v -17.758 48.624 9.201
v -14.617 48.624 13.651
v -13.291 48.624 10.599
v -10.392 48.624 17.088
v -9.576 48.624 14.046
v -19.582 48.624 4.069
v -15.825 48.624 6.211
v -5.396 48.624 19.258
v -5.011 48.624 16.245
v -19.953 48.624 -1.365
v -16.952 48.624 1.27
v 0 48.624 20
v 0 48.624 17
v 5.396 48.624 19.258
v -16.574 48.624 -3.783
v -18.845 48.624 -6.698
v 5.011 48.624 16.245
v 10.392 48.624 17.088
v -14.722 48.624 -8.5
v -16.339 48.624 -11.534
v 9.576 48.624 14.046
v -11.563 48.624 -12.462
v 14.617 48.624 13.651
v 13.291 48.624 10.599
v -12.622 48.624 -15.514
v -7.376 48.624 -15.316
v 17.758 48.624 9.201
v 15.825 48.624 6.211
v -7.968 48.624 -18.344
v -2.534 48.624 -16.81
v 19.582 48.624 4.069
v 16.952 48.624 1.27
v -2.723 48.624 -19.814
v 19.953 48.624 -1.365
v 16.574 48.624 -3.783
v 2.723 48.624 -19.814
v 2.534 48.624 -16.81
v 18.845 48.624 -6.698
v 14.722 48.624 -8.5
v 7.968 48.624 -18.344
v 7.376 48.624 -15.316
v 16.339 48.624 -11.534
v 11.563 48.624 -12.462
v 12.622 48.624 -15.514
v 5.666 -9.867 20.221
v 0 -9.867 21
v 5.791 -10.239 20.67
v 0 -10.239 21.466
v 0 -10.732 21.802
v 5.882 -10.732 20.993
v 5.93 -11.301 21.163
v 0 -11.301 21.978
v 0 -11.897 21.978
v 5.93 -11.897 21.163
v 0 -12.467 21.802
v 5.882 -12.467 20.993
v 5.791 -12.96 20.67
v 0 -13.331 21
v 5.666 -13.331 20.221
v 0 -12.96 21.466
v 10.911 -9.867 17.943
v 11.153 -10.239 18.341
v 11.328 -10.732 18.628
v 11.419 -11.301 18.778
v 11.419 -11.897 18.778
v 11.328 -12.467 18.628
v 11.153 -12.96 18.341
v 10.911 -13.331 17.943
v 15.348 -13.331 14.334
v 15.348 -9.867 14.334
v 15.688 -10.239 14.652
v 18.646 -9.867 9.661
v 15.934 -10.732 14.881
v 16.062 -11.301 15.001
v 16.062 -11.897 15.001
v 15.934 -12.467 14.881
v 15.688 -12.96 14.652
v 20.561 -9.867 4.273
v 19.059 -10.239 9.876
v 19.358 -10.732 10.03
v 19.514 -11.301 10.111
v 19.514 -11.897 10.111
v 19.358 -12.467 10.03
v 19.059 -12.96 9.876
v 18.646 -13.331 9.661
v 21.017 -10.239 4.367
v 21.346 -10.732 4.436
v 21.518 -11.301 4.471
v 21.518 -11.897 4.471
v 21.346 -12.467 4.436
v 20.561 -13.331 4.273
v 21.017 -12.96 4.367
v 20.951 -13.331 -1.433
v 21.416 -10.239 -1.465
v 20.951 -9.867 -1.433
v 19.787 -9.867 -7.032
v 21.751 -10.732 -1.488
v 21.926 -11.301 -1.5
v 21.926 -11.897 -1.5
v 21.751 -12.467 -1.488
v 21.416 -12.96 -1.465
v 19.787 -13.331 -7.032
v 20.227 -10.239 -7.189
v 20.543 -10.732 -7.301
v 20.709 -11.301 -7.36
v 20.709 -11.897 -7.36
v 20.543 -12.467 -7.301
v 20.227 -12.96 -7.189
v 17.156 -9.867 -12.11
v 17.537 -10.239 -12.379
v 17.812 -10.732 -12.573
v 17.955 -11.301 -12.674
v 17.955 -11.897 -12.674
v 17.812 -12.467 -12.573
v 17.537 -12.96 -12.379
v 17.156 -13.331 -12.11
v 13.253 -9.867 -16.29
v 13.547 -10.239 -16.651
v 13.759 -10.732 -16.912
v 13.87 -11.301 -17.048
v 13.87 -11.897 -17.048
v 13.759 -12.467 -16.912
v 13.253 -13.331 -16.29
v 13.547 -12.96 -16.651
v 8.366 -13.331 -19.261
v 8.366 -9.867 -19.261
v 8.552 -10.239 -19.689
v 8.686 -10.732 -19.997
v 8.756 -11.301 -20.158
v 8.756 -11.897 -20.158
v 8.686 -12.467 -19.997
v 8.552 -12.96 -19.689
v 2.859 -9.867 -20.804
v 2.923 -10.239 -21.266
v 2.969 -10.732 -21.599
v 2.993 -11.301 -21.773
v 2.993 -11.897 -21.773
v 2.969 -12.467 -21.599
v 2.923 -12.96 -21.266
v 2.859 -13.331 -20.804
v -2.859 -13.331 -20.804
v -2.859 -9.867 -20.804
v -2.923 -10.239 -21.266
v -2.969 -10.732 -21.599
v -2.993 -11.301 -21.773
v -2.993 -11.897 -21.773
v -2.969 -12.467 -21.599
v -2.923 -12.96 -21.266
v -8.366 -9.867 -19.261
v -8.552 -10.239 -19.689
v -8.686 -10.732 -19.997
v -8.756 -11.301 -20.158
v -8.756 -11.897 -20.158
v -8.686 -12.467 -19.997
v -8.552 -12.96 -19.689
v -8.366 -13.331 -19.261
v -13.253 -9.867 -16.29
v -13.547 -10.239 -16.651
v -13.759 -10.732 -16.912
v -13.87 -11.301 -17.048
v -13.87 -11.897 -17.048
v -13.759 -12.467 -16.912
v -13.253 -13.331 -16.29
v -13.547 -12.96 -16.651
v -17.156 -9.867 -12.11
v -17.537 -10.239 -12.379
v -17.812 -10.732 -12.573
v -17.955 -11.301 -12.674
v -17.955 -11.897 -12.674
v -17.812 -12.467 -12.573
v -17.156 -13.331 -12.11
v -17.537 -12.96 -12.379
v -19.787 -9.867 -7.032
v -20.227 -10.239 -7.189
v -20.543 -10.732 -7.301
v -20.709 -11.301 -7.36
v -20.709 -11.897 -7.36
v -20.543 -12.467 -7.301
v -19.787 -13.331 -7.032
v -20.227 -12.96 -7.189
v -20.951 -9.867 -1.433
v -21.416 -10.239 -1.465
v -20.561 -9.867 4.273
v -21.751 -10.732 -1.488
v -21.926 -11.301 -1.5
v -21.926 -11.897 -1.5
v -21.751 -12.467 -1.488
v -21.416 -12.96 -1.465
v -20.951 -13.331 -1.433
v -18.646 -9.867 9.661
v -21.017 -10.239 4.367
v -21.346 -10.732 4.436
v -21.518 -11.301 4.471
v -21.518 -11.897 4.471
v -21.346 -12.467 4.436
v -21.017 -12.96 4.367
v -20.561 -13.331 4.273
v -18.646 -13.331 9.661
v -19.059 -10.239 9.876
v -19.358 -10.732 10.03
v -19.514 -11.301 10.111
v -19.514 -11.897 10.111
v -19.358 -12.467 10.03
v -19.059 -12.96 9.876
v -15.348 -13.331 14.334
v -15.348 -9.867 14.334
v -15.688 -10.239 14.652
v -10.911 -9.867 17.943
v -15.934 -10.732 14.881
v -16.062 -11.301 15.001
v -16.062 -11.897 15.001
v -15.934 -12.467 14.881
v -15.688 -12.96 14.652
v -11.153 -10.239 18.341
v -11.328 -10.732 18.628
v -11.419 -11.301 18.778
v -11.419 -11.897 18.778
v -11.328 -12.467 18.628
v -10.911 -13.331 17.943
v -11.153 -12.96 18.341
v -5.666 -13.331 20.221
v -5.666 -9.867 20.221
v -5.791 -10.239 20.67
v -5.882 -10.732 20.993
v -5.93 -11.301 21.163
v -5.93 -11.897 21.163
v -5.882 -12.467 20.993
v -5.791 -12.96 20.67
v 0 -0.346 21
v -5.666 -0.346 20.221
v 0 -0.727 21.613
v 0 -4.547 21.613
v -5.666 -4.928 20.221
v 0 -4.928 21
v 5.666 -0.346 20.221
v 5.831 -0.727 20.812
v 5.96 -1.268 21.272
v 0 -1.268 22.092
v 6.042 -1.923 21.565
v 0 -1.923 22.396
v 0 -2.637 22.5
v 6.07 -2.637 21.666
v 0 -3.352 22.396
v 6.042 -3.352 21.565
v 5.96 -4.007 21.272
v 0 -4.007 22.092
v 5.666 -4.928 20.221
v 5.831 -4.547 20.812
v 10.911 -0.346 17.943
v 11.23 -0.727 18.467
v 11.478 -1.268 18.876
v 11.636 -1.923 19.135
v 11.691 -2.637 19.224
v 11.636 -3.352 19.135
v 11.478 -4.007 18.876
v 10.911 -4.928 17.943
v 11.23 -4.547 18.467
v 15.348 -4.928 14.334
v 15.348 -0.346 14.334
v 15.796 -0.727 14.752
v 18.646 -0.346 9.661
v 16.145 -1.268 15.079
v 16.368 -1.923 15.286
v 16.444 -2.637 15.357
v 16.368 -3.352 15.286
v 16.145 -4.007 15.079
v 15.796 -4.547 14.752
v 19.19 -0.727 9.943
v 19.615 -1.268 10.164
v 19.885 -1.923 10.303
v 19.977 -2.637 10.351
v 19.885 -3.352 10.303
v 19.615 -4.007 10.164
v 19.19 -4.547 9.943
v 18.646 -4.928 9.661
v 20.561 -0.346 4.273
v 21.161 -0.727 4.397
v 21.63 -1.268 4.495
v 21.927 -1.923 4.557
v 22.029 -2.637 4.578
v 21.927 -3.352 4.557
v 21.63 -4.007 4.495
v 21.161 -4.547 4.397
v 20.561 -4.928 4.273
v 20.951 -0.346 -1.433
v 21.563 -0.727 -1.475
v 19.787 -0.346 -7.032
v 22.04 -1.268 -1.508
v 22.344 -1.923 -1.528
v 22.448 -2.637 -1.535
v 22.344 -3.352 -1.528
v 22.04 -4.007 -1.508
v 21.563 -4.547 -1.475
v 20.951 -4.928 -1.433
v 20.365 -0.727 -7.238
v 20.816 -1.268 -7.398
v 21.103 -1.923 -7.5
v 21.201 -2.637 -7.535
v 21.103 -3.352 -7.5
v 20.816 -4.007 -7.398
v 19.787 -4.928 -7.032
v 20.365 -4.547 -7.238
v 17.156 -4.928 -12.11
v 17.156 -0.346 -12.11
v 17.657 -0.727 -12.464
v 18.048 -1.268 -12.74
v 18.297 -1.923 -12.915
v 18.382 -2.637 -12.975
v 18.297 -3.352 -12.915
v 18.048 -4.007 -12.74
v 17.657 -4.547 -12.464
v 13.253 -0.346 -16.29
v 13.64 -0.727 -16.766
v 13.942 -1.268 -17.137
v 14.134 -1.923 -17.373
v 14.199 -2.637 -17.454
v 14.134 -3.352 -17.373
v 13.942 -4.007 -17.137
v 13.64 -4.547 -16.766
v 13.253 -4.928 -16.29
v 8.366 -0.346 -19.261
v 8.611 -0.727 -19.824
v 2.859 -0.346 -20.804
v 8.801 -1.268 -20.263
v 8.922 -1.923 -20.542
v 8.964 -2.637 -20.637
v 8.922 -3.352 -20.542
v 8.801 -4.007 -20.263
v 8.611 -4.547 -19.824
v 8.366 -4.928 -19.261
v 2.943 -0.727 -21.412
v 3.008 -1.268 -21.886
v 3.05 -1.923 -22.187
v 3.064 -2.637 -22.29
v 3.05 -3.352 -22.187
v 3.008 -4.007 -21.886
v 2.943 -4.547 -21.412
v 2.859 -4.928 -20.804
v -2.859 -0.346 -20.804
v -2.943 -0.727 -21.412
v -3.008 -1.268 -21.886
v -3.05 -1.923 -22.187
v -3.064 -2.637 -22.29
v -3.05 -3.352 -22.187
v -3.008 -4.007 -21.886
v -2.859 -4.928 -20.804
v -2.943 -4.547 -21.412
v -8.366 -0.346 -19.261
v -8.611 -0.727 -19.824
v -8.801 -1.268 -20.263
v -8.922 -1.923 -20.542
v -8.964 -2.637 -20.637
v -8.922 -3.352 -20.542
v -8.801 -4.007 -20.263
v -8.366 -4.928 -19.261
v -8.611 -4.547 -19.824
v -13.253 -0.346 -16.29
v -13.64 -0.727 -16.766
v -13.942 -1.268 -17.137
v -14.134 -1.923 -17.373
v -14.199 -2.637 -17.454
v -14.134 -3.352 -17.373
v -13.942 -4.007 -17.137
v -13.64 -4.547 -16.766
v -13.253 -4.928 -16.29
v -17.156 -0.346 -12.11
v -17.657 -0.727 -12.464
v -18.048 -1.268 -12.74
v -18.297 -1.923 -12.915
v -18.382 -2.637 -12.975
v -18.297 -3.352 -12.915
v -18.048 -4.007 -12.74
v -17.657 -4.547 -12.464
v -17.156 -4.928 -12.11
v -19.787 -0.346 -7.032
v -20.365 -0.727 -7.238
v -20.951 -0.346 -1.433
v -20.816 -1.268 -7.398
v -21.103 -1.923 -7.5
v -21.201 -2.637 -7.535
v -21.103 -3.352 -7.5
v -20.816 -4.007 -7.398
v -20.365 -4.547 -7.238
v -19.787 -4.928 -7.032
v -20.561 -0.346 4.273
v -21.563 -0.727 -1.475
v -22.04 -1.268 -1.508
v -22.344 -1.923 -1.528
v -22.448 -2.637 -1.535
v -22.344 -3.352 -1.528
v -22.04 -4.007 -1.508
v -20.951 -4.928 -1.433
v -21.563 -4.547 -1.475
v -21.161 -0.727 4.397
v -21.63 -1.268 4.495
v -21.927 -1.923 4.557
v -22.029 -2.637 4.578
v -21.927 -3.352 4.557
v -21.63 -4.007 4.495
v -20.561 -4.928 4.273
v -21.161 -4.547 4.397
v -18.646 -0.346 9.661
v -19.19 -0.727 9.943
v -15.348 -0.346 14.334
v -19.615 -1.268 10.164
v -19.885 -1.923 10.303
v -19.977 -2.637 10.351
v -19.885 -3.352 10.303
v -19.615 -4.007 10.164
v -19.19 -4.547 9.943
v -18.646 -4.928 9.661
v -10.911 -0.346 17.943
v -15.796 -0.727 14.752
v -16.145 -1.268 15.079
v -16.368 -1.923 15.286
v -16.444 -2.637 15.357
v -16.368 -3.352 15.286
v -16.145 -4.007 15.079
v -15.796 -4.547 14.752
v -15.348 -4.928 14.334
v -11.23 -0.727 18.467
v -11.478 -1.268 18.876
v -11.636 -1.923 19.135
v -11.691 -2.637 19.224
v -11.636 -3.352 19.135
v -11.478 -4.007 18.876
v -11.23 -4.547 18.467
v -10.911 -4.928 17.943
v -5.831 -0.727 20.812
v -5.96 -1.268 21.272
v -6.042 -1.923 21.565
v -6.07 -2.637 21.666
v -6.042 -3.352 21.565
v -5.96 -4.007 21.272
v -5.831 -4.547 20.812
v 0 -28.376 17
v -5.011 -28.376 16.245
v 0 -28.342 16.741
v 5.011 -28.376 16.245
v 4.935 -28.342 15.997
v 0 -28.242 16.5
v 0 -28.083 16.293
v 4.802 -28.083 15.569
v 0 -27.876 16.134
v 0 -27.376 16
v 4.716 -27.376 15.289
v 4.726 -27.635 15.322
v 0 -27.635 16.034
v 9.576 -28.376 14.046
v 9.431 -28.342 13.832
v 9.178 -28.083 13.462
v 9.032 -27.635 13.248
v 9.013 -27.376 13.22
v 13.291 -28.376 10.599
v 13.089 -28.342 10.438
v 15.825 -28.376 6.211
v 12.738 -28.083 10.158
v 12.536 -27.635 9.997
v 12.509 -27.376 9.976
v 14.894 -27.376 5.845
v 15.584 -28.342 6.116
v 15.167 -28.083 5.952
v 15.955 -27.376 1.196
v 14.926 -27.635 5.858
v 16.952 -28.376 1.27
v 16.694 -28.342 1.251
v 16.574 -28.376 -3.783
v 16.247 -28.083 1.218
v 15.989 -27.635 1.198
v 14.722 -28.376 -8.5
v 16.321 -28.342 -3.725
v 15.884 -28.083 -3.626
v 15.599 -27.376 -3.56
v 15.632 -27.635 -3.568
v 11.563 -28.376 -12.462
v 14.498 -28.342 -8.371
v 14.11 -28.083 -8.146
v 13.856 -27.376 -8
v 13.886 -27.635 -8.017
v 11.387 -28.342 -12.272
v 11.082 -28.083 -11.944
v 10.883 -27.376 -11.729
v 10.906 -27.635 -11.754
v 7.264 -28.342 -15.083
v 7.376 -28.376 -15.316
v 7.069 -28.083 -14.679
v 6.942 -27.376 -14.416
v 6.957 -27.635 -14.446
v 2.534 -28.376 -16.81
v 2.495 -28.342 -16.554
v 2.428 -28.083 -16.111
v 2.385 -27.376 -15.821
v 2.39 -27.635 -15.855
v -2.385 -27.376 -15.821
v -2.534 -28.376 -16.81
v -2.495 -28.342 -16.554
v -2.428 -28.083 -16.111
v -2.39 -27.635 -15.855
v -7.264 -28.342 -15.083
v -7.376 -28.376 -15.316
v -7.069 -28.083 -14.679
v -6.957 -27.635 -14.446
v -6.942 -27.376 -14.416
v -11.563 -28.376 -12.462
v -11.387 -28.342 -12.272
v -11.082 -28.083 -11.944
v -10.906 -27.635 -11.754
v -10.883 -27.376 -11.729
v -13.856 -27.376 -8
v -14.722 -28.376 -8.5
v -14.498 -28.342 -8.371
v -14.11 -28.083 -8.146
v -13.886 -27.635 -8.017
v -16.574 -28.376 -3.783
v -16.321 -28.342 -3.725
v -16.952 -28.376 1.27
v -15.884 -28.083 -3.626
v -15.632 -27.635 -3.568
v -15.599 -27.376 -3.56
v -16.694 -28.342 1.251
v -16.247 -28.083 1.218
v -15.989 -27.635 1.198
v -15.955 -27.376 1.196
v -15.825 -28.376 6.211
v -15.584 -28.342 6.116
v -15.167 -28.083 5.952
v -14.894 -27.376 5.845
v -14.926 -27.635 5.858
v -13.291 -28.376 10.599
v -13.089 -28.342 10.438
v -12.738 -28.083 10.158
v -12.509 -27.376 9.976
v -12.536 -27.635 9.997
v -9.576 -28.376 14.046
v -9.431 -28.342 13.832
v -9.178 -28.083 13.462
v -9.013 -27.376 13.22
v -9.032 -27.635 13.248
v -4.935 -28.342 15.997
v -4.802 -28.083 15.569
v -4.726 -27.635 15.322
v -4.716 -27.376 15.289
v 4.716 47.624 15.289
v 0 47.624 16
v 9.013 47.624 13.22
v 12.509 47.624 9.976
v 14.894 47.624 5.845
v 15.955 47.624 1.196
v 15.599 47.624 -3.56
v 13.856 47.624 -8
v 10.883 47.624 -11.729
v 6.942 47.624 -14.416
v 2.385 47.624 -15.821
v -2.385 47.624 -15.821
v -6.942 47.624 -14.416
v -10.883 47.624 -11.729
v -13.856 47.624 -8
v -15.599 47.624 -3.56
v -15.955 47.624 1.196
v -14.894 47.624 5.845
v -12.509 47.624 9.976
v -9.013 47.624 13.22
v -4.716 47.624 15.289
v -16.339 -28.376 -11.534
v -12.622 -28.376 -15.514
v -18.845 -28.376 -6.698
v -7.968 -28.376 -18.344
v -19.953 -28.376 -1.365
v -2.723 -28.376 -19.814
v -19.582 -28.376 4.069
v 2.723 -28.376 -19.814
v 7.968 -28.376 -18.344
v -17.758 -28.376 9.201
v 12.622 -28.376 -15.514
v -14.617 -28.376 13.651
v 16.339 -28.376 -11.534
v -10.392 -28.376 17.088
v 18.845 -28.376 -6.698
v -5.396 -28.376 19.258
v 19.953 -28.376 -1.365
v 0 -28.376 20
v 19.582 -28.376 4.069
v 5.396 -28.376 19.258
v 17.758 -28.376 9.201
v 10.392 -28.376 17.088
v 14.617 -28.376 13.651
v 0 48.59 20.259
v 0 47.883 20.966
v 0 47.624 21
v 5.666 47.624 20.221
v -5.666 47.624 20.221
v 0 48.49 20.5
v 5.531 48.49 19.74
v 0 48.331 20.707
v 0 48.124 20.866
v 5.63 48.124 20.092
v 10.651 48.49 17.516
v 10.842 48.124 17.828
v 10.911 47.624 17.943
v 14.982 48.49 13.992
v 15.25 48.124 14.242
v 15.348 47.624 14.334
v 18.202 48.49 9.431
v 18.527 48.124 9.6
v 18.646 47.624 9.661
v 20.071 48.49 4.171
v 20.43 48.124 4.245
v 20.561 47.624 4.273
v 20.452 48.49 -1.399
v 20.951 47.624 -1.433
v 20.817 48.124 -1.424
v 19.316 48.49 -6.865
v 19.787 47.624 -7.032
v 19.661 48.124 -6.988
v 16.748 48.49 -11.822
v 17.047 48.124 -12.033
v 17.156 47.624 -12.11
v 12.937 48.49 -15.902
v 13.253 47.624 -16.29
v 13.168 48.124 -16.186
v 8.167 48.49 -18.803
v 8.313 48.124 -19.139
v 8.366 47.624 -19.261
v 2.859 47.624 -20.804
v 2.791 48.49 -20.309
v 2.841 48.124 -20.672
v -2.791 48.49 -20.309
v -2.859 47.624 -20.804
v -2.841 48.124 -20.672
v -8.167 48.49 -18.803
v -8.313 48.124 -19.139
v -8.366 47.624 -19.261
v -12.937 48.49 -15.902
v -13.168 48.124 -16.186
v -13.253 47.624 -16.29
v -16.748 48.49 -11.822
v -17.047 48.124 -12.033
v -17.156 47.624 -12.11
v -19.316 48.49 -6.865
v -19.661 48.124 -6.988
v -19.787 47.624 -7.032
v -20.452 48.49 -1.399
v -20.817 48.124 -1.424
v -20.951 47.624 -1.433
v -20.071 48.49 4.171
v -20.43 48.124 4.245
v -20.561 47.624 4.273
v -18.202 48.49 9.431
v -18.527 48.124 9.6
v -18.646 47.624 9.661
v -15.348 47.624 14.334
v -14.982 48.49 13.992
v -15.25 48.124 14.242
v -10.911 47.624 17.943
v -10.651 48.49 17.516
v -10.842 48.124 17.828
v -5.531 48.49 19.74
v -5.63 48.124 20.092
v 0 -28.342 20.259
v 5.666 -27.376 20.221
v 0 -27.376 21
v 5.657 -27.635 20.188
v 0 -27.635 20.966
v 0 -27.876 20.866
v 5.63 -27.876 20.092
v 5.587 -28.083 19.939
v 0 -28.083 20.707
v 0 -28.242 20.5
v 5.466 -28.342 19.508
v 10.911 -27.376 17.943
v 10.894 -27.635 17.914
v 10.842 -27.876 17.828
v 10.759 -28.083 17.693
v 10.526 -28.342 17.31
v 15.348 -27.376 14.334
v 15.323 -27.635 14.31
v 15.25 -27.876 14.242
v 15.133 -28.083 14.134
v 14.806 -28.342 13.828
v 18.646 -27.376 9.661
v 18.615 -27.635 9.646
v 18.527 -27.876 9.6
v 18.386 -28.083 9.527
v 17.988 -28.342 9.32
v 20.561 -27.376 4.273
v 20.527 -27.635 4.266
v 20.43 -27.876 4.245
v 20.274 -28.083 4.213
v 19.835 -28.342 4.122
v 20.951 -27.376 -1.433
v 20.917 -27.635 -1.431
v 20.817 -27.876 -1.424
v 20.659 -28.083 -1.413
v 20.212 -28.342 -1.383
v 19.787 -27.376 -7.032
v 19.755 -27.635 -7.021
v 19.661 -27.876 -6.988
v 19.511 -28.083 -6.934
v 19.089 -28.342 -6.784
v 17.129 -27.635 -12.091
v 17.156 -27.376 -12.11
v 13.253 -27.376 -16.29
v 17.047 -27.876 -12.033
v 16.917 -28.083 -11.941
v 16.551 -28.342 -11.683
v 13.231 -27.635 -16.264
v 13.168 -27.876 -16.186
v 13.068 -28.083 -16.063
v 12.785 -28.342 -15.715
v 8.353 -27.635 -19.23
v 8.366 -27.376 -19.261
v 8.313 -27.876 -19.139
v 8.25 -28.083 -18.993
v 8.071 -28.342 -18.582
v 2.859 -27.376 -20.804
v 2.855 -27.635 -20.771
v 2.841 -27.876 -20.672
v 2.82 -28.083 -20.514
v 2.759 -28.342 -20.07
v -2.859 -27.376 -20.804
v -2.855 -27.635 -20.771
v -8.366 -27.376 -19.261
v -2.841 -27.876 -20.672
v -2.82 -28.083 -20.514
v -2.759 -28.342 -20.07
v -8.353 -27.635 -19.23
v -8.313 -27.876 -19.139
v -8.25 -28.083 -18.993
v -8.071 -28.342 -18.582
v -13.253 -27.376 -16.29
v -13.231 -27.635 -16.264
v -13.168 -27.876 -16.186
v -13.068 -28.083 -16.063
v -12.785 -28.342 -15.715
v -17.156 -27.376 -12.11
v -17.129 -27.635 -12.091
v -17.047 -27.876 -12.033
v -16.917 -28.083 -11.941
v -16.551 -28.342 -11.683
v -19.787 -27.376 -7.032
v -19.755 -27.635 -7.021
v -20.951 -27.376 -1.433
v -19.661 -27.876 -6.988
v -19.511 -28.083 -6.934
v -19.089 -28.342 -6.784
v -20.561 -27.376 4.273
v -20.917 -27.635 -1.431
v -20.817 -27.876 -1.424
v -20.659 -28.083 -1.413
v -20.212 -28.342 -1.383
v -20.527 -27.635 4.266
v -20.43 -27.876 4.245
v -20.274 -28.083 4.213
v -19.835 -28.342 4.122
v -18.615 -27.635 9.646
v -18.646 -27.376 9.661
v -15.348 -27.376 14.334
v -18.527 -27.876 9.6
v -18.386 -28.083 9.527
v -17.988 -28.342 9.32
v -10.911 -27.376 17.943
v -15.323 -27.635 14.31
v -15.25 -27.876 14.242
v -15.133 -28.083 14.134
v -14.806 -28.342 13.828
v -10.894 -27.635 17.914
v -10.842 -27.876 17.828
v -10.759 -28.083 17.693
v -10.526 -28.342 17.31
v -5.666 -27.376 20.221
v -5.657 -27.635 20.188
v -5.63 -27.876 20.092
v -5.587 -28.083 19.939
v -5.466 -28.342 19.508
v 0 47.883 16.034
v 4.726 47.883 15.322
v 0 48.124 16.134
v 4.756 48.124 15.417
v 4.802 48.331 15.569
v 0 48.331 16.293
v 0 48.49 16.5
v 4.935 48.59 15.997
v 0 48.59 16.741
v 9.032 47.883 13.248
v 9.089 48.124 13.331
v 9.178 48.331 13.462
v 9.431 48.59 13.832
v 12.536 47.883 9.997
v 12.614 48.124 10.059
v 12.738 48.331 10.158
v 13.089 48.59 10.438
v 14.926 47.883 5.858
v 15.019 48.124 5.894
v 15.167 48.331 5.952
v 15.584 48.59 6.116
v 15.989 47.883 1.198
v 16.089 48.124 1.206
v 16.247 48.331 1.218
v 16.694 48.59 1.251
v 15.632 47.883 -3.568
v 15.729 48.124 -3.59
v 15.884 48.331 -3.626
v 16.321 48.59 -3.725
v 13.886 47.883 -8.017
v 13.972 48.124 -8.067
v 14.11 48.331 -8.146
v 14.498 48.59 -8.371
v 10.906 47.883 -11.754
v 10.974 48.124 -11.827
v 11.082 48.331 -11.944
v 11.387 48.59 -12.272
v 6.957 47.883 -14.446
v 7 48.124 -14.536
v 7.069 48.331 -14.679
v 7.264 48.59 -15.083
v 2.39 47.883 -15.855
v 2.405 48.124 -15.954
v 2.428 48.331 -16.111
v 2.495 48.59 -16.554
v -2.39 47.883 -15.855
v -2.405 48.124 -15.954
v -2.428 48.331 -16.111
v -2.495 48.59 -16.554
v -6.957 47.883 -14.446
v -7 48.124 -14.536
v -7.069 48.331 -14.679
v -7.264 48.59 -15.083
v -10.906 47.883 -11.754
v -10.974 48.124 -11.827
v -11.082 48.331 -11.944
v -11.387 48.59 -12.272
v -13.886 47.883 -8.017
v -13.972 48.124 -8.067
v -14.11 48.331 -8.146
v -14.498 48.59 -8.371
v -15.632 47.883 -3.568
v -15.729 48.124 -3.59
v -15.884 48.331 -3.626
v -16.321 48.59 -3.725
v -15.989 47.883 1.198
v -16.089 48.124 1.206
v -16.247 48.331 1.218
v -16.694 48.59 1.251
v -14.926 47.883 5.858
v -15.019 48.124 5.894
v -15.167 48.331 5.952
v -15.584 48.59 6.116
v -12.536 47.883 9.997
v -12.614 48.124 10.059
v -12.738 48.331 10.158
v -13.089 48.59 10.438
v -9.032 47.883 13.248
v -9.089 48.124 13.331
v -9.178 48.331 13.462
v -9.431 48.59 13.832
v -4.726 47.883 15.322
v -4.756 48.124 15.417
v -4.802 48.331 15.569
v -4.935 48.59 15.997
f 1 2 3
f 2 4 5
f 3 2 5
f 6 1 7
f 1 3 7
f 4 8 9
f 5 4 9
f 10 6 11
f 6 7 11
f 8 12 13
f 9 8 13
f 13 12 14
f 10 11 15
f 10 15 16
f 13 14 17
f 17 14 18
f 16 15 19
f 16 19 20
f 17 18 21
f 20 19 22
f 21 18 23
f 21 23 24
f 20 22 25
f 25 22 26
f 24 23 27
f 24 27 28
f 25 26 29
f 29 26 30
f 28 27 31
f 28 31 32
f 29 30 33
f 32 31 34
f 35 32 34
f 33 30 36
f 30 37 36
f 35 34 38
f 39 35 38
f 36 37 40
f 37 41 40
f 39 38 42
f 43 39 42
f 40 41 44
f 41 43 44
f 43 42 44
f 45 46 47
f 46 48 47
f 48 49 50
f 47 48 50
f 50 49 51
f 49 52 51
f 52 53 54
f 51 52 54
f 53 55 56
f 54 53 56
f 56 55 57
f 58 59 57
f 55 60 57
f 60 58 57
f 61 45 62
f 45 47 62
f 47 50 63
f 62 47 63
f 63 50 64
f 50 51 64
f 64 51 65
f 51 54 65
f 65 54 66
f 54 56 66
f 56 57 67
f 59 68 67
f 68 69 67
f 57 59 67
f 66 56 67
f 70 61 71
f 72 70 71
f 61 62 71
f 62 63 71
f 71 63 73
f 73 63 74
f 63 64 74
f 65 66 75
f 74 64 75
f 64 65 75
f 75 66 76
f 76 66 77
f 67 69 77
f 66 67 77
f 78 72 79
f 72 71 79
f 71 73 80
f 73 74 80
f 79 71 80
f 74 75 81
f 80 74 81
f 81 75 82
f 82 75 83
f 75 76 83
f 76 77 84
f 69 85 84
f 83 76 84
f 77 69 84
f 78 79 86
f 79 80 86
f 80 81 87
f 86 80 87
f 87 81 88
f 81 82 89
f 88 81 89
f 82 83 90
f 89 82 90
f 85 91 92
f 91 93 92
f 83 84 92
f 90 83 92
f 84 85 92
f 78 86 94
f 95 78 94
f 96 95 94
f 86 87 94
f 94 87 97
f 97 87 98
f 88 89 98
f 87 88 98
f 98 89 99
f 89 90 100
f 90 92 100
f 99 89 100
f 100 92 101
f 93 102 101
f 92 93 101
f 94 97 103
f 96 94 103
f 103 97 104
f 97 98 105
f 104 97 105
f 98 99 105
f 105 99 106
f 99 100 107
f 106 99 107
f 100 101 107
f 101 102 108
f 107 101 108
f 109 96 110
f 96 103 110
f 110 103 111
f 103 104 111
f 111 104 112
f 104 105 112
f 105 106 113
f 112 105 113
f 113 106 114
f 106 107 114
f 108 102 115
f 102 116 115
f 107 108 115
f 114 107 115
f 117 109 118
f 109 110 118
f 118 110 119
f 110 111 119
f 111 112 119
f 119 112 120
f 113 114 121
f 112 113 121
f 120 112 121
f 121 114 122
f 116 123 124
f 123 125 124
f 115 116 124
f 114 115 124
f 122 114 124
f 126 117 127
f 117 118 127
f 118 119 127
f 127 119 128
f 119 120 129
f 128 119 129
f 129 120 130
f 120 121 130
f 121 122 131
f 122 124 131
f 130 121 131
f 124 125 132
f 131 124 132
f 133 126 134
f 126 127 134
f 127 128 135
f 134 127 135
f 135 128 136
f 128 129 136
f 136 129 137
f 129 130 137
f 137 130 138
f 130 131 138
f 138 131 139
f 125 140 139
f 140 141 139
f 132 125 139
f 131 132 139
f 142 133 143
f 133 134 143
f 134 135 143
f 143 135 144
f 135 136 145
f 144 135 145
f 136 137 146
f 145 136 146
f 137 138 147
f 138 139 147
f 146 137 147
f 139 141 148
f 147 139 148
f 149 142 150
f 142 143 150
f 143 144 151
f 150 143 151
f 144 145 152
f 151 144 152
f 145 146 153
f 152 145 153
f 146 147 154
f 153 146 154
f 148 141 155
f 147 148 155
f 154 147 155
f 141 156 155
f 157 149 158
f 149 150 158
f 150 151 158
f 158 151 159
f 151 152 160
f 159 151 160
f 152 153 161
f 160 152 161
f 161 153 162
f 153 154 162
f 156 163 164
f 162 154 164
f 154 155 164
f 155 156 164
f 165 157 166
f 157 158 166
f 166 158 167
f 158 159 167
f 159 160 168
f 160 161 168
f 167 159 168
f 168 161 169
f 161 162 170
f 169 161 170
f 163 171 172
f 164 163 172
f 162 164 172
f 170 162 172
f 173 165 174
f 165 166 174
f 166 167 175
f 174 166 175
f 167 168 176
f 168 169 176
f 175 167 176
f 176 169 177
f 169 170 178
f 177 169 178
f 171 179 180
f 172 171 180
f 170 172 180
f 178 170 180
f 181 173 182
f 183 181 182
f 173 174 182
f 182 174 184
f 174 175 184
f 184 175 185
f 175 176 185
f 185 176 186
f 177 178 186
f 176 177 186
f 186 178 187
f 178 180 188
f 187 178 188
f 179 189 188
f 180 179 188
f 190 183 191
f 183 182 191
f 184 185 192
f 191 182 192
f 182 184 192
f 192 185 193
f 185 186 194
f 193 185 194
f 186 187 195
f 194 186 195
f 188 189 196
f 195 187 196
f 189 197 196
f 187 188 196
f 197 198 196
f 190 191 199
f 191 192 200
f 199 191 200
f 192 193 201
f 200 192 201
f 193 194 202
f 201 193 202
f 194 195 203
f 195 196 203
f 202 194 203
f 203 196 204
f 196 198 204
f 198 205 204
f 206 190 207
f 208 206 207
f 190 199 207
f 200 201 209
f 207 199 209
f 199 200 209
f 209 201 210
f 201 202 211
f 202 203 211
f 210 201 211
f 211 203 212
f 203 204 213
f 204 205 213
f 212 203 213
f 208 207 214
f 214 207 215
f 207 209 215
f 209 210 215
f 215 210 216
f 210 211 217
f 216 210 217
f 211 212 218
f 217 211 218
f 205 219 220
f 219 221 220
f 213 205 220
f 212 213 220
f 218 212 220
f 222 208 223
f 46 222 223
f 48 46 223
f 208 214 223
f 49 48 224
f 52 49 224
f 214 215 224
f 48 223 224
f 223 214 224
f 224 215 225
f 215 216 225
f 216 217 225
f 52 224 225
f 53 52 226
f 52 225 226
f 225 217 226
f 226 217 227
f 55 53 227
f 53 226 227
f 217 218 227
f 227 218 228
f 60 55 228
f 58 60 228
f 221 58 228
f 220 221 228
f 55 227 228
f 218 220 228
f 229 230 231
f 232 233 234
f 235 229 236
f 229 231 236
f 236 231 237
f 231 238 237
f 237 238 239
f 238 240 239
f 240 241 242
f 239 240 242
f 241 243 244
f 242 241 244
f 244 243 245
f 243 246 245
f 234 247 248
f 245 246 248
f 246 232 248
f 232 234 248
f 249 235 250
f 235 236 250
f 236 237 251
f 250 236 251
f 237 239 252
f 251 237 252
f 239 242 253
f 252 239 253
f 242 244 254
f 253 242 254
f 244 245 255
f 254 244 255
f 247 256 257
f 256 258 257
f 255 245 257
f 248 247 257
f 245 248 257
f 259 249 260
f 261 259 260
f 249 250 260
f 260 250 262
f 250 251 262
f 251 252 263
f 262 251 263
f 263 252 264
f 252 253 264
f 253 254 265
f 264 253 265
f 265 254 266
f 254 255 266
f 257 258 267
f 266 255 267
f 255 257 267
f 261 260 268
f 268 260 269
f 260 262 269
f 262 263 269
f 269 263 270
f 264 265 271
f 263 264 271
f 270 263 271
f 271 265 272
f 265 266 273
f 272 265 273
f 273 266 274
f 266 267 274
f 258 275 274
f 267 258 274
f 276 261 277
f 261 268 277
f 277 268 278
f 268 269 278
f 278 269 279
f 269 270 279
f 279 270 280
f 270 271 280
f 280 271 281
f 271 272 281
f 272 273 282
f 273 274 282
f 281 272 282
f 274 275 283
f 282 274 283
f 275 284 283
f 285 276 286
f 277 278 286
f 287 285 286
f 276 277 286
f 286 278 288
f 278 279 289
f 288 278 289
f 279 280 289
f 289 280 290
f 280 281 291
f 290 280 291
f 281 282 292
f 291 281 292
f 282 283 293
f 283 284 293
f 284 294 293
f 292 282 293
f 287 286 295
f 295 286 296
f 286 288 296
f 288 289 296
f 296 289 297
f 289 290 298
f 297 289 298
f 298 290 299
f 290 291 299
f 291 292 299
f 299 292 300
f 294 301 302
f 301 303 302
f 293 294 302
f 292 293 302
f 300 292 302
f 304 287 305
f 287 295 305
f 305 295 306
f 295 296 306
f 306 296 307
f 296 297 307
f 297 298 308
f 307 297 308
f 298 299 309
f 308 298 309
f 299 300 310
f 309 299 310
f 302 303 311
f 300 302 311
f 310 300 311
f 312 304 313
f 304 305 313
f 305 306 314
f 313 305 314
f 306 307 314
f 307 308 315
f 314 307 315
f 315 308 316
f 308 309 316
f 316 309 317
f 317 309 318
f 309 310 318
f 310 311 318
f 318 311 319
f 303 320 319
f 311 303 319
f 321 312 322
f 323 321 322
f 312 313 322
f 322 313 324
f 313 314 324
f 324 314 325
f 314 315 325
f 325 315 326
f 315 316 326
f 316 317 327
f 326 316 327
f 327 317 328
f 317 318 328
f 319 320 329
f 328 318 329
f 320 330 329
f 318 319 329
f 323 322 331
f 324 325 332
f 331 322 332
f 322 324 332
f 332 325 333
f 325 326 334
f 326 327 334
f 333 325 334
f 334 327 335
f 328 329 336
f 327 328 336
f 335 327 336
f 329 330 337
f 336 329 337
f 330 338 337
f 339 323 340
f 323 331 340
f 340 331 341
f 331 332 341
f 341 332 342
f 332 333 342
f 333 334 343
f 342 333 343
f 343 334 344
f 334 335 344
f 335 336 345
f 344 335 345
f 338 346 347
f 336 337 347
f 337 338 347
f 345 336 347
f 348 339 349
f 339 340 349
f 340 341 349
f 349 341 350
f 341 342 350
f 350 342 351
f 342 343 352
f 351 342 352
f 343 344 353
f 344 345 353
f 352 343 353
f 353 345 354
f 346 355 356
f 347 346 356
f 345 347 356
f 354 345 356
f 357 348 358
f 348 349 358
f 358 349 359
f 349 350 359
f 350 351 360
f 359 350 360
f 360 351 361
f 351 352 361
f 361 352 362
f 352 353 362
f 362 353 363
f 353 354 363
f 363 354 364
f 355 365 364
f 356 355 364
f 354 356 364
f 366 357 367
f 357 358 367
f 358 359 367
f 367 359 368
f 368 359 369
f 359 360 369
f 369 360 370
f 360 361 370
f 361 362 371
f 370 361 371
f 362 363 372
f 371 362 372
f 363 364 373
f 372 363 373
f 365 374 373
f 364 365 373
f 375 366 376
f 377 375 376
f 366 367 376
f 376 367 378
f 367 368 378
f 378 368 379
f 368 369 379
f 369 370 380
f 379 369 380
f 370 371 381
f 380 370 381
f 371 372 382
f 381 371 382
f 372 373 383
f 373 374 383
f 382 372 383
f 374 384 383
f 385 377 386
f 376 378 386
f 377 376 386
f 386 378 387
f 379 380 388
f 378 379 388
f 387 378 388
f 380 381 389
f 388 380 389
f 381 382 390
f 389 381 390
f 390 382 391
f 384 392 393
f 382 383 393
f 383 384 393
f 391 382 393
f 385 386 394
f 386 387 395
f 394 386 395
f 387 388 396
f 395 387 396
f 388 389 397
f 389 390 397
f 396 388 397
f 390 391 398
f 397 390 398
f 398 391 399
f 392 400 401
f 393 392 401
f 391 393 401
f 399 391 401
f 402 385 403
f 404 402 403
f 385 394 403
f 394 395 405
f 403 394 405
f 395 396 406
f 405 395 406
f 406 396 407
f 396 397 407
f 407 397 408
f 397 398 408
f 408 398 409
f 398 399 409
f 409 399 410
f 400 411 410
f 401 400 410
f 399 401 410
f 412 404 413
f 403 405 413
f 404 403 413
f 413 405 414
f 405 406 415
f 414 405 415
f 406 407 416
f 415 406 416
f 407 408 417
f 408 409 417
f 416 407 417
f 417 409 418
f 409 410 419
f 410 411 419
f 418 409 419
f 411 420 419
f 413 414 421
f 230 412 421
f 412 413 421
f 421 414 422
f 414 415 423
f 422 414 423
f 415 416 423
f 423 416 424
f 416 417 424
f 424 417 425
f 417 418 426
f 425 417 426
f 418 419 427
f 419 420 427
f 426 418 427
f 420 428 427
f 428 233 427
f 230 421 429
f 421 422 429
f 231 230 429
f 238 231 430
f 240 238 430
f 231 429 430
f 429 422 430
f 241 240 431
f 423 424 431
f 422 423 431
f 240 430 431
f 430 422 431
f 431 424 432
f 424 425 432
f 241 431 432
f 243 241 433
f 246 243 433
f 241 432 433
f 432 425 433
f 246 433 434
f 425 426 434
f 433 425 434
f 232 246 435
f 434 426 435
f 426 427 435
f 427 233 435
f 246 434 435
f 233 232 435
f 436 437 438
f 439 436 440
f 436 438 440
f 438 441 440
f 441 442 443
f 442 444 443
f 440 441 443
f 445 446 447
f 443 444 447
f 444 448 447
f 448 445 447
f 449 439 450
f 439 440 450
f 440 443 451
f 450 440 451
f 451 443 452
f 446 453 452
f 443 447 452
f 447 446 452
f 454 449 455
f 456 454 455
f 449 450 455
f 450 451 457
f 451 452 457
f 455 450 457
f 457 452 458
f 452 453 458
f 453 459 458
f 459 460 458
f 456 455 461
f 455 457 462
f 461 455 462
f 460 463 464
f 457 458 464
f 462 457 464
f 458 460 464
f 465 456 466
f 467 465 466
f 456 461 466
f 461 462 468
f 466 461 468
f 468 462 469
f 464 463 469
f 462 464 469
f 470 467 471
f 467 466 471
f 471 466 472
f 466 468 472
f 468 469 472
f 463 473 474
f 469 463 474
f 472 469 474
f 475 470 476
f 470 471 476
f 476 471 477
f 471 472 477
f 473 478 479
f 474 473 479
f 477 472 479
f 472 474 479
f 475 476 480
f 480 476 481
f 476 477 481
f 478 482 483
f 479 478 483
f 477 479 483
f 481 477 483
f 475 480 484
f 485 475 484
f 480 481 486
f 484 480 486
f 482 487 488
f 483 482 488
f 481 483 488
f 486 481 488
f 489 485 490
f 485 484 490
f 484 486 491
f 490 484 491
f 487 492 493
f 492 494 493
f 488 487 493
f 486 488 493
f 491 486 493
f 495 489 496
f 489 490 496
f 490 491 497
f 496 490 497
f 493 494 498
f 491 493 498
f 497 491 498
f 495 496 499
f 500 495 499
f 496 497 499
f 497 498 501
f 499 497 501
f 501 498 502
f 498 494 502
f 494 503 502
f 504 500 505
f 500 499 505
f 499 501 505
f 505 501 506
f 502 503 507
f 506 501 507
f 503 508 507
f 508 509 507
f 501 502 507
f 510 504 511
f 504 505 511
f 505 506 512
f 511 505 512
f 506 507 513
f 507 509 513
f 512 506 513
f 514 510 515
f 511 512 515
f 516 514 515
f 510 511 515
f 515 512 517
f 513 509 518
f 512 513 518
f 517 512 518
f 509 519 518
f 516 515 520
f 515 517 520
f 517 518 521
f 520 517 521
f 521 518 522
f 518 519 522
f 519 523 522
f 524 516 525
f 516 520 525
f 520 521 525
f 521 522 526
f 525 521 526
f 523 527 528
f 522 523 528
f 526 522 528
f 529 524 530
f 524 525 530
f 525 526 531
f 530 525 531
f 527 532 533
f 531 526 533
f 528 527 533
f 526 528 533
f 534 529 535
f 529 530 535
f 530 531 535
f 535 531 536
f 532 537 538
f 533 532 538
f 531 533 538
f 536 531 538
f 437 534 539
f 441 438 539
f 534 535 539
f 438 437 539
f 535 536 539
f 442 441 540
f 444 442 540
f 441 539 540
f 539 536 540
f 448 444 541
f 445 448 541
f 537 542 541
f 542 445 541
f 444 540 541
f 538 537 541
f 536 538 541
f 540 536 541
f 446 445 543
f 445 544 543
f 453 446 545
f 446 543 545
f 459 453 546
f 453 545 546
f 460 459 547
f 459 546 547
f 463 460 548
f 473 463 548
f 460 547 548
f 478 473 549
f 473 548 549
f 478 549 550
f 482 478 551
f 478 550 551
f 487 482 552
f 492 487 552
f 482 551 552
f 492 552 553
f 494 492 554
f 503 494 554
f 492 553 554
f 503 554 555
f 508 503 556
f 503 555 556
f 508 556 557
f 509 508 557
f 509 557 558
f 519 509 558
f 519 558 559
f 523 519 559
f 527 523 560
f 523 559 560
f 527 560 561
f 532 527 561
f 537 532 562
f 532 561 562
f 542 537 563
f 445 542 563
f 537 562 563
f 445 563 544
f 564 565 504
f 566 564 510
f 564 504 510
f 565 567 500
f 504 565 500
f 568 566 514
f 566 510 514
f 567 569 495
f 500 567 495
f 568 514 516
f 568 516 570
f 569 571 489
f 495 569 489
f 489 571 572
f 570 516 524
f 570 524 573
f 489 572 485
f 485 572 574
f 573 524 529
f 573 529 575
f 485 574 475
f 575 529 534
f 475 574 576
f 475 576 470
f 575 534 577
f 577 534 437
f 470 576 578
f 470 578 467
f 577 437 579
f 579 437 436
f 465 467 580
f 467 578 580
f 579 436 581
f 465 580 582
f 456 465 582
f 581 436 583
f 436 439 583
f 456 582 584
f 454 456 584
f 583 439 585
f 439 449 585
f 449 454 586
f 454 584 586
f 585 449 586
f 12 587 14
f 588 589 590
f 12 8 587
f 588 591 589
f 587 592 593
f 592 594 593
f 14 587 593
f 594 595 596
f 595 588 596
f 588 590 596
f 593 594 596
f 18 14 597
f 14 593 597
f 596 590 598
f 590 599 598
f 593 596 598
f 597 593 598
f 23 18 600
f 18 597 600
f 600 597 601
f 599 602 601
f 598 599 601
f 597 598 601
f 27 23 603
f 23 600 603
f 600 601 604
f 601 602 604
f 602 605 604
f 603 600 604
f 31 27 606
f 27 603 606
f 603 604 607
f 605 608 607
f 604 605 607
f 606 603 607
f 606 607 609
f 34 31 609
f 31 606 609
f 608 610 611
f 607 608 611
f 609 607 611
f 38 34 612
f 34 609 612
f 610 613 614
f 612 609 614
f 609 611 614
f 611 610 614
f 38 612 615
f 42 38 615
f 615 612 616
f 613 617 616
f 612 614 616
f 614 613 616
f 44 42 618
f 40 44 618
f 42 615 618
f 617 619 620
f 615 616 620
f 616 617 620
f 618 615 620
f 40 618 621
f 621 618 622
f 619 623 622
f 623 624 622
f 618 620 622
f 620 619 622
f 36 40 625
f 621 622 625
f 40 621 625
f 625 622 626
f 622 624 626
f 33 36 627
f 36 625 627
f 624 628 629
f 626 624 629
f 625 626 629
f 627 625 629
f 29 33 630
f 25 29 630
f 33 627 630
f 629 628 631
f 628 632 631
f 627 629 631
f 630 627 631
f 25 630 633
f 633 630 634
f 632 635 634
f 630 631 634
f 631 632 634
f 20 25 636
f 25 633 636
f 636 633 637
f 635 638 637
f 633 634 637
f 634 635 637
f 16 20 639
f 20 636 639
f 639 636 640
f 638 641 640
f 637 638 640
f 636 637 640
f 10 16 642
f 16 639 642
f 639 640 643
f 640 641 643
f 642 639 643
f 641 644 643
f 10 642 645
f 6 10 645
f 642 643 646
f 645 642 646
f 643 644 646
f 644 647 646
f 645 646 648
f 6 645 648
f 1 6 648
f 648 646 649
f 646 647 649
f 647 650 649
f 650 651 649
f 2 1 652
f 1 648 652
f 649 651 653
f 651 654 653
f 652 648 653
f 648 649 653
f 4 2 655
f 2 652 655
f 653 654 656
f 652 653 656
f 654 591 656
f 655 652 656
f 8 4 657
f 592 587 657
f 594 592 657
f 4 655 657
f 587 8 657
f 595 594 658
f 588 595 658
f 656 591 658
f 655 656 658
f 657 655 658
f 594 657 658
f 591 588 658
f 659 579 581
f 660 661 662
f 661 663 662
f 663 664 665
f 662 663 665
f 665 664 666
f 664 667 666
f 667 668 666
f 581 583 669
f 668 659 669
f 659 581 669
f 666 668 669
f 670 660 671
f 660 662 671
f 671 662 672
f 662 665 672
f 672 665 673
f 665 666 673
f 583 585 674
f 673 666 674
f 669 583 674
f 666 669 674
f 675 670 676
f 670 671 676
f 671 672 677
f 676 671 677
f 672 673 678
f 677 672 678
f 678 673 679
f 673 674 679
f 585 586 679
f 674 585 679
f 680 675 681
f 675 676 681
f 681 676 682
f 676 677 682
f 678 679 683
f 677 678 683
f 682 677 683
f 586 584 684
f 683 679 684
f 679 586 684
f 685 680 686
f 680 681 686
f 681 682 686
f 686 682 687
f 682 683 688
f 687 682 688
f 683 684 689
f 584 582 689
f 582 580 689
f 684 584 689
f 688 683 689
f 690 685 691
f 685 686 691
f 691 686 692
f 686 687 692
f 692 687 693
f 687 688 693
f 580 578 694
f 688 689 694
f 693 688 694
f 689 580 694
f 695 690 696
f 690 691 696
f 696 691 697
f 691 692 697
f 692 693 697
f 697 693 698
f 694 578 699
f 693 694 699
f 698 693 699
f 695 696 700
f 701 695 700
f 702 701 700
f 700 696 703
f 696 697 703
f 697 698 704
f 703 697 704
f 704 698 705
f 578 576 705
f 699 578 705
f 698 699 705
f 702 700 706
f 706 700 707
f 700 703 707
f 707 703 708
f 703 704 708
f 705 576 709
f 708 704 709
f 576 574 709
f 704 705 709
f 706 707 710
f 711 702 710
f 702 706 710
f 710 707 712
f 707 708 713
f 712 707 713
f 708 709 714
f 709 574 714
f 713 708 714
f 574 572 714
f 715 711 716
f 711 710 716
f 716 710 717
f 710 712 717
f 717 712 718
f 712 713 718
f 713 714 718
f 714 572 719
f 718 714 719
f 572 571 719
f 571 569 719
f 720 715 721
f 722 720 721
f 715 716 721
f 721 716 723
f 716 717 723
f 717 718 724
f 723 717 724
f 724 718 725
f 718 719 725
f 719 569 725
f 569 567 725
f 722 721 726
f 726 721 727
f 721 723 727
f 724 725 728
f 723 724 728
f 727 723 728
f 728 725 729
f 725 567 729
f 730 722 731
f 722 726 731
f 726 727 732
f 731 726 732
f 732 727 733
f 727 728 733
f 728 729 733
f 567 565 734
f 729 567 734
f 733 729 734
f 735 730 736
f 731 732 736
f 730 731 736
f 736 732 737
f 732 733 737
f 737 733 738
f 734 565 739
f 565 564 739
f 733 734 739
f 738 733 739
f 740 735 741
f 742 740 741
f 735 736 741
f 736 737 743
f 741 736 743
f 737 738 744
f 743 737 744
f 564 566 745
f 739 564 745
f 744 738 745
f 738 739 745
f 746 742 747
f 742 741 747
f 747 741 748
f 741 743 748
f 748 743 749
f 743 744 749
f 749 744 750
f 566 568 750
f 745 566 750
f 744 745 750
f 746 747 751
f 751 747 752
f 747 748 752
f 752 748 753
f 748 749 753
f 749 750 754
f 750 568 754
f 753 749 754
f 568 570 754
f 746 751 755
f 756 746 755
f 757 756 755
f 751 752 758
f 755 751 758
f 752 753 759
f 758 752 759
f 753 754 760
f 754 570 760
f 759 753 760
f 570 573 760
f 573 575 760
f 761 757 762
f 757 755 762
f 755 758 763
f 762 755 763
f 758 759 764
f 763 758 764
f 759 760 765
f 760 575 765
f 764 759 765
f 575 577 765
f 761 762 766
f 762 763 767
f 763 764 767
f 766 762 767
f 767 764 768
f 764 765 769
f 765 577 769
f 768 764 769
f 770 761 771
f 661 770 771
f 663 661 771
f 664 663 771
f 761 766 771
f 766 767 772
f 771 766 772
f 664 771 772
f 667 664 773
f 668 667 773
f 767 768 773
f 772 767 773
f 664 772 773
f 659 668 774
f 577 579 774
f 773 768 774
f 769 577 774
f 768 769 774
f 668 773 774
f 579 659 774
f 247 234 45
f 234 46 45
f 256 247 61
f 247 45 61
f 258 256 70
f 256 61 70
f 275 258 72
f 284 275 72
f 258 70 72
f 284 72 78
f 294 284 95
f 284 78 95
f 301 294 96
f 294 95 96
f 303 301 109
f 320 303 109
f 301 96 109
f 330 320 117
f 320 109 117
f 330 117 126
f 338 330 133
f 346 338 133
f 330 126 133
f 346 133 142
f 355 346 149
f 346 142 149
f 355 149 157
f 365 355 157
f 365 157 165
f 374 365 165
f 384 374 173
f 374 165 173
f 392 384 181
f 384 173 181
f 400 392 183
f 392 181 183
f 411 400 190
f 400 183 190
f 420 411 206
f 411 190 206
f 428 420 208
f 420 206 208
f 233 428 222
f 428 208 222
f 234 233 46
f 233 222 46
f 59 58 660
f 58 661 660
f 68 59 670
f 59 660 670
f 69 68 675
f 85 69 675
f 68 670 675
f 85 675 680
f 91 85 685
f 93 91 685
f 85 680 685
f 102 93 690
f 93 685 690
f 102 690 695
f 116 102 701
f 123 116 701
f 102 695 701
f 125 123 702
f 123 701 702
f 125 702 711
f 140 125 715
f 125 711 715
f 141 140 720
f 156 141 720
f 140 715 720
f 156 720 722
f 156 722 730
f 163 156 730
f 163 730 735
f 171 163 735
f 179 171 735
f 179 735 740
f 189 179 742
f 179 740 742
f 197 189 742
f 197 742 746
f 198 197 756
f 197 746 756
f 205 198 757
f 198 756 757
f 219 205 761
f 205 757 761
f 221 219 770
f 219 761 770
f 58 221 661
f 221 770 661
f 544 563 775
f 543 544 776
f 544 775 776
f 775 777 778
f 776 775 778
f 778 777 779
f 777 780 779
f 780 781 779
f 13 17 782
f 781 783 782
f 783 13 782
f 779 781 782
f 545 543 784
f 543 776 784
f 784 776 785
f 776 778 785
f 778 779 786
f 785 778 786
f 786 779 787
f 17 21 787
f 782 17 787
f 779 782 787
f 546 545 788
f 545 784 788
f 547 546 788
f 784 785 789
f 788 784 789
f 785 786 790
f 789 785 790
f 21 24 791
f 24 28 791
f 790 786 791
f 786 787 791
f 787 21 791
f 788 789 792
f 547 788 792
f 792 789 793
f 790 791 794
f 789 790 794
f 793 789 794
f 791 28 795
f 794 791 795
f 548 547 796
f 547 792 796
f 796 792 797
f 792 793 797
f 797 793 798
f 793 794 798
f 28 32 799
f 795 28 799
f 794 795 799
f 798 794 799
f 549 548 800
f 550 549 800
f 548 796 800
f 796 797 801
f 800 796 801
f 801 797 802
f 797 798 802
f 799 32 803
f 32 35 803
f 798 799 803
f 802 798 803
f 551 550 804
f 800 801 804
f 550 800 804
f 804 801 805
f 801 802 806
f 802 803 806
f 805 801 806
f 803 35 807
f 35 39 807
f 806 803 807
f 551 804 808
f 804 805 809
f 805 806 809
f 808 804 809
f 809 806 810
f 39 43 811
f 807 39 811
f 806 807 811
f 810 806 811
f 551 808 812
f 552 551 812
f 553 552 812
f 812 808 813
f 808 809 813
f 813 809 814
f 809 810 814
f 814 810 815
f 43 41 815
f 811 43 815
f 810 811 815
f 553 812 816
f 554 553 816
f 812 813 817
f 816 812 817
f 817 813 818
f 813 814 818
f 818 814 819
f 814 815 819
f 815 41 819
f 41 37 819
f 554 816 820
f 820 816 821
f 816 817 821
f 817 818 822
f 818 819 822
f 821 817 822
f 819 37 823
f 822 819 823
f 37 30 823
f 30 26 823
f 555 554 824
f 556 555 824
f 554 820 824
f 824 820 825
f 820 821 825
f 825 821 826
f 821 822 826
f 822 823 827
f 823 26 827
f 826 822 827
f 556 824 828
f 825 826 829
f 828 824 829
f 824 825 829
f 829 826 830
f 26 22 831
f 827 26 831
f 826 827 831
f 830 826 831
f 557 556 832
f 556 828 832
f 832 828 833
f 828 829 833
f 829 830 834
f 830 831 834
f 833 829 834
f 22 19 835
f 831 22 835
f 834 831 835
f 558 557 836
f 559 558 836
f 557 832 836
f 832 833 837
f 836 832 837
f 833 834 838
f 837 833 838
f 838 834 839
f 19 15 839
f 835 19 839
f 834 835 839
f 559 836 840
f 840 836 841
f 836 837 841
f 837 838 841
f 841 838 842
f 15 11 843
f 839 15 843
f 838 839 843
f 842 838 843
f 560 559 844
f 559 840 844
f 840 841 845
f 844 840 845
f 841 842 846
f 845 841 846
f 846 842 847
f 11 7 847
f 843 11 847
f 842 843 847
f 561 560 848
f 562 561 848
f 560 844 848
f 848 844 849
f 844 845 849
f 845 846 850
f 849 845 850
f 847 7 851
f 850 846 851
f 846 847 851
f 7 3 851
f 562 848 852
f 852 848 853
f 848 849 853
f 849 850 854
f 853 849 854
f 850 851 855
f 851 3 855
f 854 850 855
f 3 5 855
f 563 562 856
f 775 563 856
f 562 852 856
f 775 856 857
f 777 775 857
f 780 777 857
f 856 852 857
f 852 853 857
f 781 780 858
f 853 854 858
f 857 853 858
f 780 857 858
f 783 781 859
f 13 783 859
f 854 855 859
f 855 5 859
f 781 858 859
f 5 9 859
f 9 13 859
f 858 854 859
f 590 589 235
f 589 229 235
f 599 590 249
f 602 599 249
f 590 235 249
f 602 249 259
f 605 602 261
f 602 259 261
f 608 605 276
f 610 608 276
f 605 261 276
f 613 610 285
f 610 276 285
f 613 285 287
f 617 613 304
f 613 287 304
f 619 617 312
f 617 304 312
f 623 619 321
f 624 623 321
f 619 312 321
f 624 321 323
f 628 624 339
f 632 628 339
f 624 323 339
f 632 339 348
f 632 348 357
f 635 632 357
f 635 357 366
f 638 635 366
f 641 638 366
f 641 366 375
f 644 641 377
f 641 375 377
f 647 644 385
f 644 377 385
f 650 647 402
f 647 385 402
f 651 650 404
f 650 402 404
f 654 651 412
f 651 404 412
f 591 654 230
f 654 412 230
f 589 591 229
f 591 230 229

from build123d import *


with BuildPart() as f1:
    # F0 (on Right) → F1 (revolve)
    with BuildSketch(Plane.YZ):
        with BuildLine():
            Line((-18.375826, 21), (-27.375826, 21))
            ThreePointArc((-27.375826, 21), (-28.082933, 20.707107), (-28.375826, 20))
            Line((-28.375826, 20), (-28.375826, 17))
            ThreePointArc((-28.375826, 17), (-28.082933, 16.292893), (-27.375826, 16))
            Line((-27.375826, 16), (47.624174, 16))
            ThreePointArc((47.624174, 16), (48.331281, 16.292893), (48.624174, 17))
            Line((48.624174, 17), (48.624174, 20))
            ThreePointArc((48.624174, 20), (48.331281, 20.707107), (47.624174, 21))
            Line((47.624174, 21), (-0.345918, 21))
            Line((-0.345918, 21), (-4.928493, 21))
            Line((-4.928493, 21), (-9.867342, 21))
            Line((-9.867342, 21), (-13.331443, 21))
            Line((-13.331443, 21), (-18.375826, 21))
        make_face()
        with BuildLine():
            ThreePointArc((-9.867342, 21), (-11.599393, 22), (-13.331443, 21))
            Line((-13.331443, 21), (-9.867342, 21))
        make_face()
        with BuildLine():
            ThreePointArc((-0.345918, 21), (-2.637205, 22.5), (-4.928493, 21))
            Line((-4.928493, 21), (-0.345918, 21))
        make_face()
    revolve(axis=Axis((0, 6.925453, 0), (0, 1, 0)))


solid = f1.part
